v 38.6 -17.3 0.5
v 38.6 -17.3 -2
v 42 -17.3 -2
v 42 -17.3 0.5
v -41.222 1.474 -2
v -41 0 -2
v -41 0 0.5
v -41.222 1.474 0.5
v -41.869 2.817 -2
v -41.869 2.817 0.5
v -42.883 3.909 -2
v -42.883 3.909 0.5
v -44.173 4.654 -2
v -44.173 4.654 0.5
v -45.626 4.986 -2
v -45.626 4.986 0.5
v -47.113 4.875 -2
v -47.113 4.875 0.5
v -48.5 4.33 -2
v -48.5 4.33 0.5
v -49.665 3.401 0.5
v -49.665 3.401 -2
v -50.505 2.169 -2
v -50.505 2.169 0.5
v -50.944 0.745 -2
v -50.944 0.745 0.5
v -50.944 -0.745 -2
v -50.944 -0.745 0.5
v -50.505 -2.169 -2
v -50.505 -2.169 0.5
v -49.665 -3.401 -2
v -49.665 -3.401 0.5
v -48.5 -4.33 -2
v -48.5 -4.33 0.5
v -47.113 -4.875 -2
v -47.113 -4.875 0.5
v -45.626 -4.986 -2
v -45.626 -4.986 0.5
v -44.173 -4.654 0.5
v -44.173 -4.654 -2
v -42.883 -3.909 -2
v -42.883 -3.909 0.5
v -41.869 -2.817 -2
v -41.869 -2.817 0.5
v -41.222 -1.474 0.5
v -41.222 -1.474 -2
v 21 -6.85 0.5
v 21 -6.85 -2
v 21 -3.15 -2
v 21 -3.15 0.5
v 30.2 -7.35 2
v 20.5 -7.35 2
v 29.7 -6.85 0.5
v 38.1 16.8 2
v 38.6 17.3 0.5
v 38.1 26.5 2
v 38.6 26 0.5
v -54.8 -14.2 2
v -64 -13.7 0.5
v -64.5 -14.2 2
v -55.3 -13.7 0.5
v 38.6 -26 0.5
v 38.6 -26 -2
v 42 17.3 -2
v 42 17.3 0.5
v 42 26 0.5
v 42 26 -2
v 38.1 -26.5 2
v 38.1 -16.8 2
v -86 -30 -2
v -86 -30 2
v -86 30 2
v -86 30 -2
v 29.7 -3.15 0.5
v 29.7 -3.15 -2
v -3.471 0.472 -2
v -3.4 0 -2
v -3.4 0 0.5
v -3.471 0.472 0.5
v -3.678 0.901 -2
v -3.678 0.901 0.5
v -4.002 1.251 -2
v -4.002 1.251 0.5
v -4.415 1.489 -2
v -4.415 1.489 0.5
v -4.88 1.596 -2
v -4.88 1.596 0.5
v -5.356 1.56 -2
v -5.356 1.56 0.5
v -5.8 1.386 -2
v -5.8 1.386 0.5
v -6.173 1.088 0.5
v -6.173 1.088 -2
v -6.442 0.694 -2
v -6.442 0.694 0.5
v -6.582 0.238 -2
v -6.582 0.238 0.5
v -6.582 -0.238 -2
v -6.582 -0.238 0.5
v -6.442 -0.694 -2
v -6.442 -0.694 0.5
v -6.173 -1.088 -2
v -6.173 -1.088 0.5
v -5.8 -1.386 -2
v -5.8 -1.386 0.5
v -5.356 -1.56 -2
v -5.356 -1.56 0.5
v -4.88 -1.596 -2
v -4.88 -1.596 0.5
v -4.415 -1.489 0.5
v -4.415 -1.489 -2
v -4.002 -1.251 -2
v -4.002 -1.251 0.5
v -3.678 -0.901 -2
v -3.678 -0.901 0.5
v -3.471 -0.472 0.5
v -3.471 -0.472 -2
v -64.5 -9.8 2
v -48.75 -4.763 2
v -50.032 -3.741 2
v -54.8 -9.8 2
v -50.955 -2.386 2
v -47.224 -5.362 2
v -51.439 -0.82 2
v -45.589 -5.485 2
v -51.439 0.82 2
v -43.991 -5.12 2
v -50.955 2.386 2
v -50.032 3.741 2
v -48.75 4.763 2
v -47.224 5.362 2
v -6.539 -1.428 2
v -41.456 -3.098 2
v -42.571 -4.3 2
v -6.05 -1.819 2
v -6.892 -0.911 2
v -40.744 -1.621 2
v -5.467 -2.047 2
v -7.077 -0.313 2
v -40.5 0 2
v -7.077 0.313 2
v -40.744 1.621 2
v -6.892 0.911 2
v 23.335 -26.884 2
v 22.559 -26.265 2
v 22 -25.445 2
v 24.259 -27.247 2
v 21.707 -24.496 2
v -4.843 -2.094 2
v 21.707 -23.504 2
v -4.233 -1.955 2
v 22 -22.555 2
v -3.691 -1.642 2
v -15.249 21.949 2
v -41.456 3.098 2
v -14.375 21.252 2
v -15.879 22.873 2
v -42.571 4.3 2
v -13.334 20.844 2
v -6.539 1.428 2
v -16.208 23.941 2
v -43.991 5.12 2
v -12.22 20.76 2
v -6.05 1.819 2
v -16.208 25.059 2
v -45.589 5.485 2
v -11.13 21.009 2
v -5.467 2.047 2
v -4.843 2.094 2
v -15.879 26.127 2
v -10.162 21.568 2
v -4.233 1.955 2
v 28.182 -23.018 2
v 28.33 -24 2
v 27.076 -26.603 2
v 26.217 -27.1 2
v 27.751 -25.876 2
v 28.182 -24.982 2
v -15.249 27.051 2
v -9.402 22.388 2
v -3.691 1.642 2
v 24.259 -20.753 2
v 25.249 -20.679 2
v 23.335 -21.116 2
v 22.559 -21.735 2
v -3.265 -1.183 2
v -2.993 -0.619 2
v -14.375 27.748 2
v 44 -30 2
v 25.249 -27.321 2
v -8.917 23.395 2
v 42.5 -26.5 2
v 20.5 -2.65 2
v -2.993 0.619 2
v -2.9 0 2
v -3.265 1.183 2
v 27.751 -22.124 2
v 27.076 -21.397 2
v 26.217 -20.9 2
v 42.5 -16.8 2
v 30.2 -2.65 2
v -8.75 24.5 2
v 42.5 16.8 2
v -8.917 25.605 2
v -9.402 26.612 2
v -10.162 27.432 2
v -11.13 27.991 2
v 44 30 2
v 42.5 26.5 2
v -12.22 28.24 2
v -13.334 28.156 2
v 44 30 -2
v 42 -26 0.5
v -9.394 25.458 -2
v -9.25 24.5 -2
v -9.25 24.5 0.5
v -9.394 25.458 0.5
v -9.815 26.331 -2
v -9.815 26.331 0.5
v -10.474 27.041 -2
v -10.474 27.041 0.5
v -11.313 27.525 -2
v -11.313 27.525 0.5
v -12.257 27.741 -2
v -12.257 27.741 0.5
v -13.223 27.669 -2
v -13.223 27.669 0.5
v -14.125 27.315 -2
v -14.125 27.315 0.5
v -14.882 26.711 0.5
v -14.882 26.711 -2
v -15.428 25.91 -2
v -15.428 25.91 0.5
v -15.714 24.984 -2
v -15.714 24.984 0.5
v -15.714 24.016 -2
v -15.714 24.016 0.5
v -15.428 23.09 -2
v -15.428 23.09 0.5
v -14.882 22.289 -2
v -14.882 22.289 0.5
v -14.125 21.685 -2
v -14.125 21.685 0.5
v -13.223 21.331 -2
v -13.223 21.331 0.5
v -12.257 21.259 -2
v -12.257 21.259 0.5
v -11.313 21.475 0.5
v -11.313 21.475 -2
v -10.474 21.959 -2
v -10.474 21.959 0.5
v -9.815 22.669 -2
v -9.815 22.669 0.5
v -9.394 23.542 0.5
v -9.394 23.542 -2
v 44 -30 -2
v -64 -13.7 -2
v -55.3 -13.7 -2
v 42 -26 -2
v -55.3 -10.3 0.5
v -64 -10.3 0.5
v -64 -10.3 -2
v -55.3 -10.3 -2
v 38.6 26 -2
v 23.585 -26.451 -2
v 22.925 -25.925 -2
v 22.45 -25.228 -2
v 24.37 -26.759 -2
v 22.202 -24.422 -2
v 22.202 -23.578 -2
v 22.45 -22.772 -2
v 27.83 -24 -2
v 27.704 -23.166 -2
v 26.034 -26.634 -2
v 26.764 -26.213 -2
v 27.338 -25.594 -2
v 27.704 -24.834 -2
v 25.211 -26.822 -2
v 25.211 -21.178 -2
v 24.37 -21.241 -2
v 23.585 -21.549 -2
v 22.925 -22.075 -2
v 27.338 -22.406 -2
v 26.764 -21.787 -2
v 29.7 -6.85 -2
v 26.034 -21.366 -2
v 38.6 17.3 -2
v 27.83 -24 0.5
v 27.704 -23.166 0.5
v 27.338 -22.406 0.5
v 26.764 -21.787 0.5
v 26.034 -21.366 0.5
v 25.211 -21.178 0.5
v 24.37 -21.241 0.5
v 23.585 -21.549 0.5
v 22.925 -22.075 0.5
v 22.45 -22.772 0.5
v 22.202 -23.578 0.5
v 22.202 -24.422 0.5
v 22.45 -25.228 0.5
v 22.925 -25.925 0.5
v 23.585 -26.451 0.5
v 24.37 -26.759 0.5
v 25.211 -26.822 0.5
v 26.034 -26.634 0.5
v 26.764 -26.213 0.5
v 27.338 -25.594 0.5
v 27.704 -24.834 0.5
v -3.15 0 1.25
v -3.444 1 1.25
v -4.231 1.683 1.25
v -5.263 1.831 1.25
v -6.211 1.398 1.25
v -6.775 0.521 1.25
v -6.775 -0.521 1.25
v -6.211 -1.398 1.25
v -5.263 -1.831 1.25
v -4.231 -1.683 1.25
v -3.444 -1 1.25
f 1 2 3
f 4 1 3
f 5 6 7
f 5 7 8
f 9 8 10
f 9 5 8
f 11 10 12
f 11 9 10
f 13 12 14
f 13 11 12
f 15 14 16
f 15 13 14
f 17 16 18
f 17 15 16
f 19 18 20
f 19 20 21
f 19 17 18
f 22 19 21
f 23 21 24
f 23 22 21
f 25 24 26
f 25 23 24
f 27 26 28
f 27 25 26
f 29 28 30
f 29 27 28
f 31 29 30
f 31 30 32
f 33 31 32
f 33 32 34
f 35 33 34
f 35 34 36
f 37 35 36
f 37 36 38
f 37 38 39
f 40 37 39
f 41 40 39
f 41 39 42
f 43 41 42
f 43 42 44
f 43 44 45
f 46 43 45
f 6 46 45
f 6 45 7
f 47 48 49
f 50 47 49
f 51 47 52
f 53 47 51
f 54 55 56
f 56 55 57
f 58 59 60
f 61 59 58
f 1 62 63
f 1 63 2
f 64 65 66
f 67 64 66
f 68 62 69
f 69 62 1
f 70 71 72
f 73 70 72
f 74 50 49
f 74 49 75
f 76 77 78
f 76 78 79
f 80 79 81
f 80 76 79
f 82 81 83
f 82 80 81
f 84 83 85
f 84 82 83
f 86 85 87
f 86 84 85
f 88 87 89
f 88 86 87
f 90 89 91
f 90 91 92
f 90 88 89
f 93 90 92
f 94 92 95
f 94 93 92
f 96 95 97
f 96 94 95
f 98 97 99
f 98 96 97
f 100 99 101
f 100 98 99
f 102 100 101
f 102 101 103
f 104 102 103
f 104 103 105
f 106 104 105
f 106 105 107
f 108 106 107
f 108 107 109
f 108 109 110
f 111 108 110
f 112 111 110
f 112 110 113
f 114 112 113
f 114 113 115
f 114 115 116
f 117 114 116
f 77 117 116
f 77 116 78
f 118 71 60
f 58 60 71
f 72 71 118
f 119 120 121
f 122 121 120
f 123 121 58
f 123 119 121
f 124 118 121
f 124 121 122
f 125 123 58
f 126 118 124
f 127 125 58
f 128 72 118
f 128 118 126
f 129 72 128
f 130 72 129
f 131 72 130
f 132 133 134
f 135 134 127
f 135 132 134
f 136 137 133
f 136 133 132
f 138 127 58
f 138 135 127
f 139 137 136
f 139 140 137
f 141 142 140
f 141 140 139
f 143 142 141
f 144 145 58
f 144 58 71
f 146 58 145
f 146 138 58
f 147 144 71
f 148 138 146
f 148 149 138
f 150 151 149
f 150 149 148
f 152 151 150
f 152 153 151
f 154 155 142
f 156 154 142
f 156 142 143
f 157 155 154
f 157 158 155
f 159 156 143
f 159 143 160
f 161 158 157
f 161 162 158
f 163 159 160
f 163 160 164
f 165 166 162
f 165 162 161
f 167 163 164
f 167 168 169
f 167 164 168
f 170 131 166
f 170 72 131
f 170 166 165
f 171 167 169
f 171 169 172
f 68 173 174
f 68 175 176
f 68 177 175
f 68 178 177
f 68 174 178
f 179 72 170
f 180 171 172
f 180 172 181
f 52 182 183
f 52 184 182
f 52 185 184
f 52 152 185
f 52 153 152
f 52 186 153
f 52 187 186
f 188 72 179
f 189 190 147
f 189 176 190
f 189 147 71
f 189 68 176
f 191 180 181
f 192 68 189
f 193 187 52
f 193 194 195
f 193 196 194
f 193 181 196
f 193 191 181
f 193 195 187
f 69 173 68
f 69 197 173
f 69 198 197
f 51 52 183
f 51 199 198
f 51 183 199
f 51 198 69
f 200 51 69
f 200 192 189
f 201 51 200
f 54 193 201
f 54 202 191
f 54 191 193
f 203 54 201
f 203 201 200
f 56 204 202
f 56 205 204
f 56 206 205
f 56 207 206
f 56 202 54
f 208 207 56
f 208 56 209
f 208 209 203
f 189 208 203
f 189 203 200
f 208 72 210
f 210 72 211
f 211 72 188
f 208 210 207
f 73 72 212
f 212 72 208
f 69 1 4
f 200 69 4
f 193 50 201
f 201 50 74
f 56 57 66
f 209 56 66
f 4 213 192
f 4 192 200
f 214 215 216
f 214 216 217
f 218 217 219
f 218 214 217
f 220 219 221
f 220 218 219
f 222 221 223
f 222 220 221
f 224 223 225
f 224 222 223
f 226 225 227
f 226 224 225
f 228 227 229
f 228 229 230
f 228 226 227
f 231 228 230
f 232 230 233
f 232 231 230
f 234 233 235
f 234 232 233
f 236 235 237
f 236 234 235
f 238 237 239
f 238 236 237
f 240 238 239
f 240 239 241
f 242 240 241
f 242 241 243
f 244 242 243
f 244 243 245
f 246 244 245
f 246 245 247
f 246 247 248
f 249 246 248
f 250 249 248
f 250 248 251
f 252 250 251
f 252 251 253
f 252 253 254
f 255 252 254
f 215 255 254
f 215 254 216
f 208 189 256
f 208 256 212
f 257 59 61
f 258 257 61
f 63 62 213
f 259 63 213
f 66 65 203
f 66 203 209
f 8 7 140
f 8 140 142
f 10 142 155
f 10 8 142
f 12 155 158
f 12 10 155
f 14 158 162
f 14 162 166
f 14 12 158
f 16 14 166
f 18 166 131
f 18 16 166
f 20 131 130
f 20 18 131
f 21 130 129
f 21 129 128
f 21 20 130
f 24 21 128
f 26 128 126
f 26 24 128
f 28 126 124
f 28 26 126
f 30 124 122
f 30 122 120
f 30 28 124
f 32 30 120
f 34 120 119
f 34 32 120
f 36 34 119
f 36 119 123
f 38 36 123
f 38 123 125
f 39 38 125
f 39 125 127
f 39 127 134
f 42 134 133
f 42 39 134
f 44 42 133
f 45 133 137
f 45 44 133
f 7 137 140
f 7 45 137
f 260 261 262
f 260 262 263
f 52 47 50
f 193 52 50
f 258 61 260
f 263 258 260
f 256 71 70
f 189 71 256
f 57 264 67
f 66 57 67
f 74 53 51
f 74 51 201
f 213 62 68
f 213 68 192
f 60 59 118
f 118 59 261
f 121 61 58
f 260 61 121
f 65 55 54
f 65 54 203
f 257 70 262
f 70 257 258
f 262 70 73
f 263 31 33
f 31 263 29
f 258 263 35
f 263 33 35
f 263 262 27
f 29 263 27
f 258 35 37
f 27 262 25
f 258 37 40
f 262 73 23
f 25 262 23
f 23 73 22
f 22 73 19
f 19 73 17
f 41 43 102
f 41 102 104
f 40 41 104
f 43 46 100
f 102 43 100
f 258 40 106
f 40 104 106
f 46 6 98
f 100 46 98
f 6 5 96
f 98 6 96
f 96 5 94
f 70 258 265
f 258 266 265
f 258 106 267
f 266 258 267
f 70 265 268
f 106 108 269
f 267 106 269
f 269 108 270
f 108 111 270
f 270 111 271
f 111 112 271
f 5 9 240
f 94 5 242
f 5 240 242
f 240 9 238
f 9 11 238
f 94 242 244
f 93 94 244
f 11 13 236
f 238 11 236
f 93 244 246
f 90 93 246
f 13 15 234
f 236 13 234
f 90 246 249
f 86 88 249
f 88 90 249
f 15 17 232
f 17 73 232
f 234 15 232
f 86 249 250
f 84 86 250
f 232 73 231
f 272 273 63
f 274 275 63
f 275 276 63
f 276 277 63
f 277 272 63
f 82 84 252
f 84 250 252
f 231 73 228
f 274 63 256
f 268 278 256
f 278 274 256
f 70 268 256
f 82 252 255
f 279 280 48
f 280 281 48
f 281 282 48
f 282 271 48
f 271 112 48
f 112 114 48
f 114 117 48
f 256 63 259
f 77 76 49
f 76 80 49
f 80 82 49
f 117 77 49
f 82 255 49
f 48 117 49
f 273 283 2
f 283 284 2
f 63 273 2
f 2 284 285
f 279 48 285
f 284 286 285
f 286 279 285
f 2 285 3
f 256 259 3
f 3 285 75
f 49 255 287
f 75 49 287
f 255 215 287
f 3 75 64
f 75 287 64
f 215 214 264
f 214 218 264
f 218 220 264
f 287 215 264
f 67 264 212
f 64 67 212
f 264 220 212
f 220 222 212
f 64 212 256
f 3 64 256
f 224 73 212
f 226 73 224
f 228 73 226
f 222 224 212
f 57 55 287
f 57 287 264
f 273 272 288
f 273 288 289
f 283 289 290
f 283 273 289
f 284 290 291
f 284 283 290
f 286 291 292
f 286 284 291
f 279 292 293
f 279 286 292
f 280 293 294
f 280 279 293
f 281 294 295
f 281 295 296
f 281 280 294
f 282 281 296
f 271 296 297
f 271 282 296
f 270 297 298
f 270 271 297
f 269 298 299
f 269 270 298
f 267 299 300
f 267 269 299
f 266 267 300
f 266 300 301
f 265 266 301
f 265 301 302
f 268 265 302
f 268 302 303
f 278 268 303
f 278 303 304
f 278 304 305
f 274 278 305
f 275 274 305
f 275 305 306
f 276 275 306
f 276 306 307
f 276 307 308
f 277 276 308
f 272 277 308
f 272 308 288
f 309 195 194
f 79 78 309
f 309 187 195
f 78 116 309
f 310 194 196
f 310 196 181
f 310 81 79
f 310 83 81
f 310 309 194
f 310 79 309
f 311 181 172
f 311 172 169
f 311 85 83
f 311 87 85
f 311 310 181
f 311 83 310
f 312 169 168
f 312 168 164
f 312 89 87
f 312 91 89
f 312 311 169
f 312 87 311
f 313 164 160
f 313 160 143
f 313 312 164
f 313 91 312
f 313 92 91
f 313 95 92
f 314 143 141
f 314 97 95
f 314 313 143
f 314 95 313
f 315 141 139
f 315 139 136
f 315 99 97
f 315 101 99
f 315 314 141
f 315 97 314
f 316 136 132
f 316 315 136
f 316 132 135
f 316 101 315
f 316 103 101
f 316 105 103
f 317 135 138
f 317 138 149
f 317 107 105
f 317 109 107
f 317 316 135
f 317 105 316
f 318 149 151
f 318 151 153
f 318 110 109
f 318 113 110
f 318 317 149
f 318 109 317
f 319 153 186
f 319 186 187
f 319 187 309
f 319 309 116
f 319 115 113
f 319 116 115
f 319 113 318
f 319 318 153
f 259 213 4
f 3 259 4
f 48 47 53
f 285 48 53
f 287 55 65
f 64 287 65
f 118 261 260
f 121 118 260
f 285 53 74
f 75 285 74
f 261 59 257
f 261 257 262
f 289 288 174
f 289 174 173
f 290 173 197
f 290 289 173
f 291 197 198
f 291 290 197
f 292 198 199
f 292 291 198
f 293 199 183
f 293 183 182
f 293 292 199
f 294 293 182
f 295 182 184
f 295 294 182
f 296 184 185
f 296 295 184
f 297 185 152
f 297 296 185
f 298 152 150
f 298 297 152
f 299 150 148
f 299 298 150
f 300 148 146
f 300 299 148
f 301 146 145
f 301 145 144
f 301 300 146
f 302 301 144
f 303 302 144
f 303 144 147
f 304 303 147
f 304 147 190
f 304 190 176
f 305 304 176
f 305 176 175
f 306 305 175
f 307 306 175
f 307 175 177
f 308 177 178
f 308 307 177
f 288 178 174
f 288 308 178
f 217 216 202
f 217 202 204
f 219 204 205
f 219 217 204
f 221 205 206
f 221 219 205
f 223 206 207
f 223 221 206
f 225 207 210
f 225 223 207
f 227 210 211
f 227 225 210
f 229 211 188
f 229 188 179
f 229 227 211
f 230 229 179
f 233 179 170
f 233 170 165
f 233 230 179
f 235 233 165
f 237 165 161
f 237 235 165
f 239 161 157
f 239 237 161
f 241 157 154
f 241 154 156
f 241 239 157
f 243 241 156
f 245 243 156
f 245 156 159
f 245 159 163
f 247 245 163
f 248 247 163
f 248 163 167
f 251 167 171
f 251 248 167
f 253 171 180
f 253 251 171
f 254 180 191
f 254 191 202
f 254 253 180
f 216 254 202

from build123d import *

# Parameters (mm, degrees)
SKETCH1_W           = 130
SKETCH1_H           = 60
SKETCH1_R           = 5
SKETCH1_R_2         = 3.25
SKETCH1_R_3         = 2.83
SKETCH1_R_4         = 1.6
SKETCH1_W_2         = 8.7
SKETCH1_H_2         = 3.4
SKETCH1_W_3         = 3.4
SKETCH1_H_3         = 8.7
SKETCH1_H_4         = 3.7
BOSS_EXTRUDE1_DEPTH = 2
CHAMFER1_SIZE       = 0.5
CHAMFER1_SIZE2      = 1.5


with BuildPart() as part:
    # Sketch1 → Boss-Extrude1 (new, symmetric)
    with BuildSketch(Plane.XY):
        with Locations((-21, 0)):
            Rectangle(SKETCH1_W, SKETCH1_H)
        with Locations((-46, 0)):
            Circle(SKETCH1_R, mode=Mode.SUBTRACT)
        with Locations((-12.5, 24.5)):
            Circle(SKETCH1_R_2, mode=Mode.SUBTRACT)
        with Locations((25, -24)):
            Circle(SKETCH1_R_3, mode=Mode.SUBTRACT)
        with Locations((-5, 0)):
            Circle(SKETCH1_R_4, mode=Mode.SUBTRACT)
        with Locations((-59.65, -12)):
            Rectangle(SKETCH1_W_2, SKETCH1_H_2, mode=Mode.SUBTRACT)
        with Locations((40.3, 21.65)):
            Rectangle(SKETCH1_W_3, SKETCH1_H_3, mode=Mode.SUBTRACT)
        with Locations((40.3, -21.65)):
            Rectangle(SKETCH1_W_3, SKETCH1_H_3, mode=Mode.SUBTRACT)
        with Locations((25.35, -5)):
            Rectangle(SKETCH1_W_2, SKETCH1_H_4, mode=Mode.SUBTRACT)
    extrude(amount=BOSS_EXTRUDE1_DEPTH, both=True)

    # Chamfer1
    chamfer1_edges = [part.edges().sort_by_distance(p)[0] for p in [
        (21, -5, 2),
        (25.35, -6.85, 2),
        (29.7, -5, 2),
        (25.35, -3.15, 2),
        (-64, -12, 2),
        (-59.65, -13.7, 2),
        (-55.3, -12, 2),
        (-59.65, -10.3, 2),
        (-15.75, 24.5, 2),
        (-51, 0, 2),
        (22.17, -24, 2),
        (-6.6, 0, 2),
        (38.6, 21.65, 2),
        (40.3, 17.3, 2),
        (42, 21.65, 2),
        (40.3, 26, 2),
        (38.6, -21.65, 2),
        (40.3, -26, 2),
        (42, -21.65, 2),
        (40.3, -17.3, 2),
    ]]
    chamfer1_side = [part.faces().sort_by_distance(p)[0] for p in [
        (-21.475154196, 0.040718834, 2),
    ]]
    chamfer(chamfer1_edges, length=CHAMFER1_SIZE, length2=CHAMFER1_SIZE2, reference=chamfer1_side[0])


solid = part.part
